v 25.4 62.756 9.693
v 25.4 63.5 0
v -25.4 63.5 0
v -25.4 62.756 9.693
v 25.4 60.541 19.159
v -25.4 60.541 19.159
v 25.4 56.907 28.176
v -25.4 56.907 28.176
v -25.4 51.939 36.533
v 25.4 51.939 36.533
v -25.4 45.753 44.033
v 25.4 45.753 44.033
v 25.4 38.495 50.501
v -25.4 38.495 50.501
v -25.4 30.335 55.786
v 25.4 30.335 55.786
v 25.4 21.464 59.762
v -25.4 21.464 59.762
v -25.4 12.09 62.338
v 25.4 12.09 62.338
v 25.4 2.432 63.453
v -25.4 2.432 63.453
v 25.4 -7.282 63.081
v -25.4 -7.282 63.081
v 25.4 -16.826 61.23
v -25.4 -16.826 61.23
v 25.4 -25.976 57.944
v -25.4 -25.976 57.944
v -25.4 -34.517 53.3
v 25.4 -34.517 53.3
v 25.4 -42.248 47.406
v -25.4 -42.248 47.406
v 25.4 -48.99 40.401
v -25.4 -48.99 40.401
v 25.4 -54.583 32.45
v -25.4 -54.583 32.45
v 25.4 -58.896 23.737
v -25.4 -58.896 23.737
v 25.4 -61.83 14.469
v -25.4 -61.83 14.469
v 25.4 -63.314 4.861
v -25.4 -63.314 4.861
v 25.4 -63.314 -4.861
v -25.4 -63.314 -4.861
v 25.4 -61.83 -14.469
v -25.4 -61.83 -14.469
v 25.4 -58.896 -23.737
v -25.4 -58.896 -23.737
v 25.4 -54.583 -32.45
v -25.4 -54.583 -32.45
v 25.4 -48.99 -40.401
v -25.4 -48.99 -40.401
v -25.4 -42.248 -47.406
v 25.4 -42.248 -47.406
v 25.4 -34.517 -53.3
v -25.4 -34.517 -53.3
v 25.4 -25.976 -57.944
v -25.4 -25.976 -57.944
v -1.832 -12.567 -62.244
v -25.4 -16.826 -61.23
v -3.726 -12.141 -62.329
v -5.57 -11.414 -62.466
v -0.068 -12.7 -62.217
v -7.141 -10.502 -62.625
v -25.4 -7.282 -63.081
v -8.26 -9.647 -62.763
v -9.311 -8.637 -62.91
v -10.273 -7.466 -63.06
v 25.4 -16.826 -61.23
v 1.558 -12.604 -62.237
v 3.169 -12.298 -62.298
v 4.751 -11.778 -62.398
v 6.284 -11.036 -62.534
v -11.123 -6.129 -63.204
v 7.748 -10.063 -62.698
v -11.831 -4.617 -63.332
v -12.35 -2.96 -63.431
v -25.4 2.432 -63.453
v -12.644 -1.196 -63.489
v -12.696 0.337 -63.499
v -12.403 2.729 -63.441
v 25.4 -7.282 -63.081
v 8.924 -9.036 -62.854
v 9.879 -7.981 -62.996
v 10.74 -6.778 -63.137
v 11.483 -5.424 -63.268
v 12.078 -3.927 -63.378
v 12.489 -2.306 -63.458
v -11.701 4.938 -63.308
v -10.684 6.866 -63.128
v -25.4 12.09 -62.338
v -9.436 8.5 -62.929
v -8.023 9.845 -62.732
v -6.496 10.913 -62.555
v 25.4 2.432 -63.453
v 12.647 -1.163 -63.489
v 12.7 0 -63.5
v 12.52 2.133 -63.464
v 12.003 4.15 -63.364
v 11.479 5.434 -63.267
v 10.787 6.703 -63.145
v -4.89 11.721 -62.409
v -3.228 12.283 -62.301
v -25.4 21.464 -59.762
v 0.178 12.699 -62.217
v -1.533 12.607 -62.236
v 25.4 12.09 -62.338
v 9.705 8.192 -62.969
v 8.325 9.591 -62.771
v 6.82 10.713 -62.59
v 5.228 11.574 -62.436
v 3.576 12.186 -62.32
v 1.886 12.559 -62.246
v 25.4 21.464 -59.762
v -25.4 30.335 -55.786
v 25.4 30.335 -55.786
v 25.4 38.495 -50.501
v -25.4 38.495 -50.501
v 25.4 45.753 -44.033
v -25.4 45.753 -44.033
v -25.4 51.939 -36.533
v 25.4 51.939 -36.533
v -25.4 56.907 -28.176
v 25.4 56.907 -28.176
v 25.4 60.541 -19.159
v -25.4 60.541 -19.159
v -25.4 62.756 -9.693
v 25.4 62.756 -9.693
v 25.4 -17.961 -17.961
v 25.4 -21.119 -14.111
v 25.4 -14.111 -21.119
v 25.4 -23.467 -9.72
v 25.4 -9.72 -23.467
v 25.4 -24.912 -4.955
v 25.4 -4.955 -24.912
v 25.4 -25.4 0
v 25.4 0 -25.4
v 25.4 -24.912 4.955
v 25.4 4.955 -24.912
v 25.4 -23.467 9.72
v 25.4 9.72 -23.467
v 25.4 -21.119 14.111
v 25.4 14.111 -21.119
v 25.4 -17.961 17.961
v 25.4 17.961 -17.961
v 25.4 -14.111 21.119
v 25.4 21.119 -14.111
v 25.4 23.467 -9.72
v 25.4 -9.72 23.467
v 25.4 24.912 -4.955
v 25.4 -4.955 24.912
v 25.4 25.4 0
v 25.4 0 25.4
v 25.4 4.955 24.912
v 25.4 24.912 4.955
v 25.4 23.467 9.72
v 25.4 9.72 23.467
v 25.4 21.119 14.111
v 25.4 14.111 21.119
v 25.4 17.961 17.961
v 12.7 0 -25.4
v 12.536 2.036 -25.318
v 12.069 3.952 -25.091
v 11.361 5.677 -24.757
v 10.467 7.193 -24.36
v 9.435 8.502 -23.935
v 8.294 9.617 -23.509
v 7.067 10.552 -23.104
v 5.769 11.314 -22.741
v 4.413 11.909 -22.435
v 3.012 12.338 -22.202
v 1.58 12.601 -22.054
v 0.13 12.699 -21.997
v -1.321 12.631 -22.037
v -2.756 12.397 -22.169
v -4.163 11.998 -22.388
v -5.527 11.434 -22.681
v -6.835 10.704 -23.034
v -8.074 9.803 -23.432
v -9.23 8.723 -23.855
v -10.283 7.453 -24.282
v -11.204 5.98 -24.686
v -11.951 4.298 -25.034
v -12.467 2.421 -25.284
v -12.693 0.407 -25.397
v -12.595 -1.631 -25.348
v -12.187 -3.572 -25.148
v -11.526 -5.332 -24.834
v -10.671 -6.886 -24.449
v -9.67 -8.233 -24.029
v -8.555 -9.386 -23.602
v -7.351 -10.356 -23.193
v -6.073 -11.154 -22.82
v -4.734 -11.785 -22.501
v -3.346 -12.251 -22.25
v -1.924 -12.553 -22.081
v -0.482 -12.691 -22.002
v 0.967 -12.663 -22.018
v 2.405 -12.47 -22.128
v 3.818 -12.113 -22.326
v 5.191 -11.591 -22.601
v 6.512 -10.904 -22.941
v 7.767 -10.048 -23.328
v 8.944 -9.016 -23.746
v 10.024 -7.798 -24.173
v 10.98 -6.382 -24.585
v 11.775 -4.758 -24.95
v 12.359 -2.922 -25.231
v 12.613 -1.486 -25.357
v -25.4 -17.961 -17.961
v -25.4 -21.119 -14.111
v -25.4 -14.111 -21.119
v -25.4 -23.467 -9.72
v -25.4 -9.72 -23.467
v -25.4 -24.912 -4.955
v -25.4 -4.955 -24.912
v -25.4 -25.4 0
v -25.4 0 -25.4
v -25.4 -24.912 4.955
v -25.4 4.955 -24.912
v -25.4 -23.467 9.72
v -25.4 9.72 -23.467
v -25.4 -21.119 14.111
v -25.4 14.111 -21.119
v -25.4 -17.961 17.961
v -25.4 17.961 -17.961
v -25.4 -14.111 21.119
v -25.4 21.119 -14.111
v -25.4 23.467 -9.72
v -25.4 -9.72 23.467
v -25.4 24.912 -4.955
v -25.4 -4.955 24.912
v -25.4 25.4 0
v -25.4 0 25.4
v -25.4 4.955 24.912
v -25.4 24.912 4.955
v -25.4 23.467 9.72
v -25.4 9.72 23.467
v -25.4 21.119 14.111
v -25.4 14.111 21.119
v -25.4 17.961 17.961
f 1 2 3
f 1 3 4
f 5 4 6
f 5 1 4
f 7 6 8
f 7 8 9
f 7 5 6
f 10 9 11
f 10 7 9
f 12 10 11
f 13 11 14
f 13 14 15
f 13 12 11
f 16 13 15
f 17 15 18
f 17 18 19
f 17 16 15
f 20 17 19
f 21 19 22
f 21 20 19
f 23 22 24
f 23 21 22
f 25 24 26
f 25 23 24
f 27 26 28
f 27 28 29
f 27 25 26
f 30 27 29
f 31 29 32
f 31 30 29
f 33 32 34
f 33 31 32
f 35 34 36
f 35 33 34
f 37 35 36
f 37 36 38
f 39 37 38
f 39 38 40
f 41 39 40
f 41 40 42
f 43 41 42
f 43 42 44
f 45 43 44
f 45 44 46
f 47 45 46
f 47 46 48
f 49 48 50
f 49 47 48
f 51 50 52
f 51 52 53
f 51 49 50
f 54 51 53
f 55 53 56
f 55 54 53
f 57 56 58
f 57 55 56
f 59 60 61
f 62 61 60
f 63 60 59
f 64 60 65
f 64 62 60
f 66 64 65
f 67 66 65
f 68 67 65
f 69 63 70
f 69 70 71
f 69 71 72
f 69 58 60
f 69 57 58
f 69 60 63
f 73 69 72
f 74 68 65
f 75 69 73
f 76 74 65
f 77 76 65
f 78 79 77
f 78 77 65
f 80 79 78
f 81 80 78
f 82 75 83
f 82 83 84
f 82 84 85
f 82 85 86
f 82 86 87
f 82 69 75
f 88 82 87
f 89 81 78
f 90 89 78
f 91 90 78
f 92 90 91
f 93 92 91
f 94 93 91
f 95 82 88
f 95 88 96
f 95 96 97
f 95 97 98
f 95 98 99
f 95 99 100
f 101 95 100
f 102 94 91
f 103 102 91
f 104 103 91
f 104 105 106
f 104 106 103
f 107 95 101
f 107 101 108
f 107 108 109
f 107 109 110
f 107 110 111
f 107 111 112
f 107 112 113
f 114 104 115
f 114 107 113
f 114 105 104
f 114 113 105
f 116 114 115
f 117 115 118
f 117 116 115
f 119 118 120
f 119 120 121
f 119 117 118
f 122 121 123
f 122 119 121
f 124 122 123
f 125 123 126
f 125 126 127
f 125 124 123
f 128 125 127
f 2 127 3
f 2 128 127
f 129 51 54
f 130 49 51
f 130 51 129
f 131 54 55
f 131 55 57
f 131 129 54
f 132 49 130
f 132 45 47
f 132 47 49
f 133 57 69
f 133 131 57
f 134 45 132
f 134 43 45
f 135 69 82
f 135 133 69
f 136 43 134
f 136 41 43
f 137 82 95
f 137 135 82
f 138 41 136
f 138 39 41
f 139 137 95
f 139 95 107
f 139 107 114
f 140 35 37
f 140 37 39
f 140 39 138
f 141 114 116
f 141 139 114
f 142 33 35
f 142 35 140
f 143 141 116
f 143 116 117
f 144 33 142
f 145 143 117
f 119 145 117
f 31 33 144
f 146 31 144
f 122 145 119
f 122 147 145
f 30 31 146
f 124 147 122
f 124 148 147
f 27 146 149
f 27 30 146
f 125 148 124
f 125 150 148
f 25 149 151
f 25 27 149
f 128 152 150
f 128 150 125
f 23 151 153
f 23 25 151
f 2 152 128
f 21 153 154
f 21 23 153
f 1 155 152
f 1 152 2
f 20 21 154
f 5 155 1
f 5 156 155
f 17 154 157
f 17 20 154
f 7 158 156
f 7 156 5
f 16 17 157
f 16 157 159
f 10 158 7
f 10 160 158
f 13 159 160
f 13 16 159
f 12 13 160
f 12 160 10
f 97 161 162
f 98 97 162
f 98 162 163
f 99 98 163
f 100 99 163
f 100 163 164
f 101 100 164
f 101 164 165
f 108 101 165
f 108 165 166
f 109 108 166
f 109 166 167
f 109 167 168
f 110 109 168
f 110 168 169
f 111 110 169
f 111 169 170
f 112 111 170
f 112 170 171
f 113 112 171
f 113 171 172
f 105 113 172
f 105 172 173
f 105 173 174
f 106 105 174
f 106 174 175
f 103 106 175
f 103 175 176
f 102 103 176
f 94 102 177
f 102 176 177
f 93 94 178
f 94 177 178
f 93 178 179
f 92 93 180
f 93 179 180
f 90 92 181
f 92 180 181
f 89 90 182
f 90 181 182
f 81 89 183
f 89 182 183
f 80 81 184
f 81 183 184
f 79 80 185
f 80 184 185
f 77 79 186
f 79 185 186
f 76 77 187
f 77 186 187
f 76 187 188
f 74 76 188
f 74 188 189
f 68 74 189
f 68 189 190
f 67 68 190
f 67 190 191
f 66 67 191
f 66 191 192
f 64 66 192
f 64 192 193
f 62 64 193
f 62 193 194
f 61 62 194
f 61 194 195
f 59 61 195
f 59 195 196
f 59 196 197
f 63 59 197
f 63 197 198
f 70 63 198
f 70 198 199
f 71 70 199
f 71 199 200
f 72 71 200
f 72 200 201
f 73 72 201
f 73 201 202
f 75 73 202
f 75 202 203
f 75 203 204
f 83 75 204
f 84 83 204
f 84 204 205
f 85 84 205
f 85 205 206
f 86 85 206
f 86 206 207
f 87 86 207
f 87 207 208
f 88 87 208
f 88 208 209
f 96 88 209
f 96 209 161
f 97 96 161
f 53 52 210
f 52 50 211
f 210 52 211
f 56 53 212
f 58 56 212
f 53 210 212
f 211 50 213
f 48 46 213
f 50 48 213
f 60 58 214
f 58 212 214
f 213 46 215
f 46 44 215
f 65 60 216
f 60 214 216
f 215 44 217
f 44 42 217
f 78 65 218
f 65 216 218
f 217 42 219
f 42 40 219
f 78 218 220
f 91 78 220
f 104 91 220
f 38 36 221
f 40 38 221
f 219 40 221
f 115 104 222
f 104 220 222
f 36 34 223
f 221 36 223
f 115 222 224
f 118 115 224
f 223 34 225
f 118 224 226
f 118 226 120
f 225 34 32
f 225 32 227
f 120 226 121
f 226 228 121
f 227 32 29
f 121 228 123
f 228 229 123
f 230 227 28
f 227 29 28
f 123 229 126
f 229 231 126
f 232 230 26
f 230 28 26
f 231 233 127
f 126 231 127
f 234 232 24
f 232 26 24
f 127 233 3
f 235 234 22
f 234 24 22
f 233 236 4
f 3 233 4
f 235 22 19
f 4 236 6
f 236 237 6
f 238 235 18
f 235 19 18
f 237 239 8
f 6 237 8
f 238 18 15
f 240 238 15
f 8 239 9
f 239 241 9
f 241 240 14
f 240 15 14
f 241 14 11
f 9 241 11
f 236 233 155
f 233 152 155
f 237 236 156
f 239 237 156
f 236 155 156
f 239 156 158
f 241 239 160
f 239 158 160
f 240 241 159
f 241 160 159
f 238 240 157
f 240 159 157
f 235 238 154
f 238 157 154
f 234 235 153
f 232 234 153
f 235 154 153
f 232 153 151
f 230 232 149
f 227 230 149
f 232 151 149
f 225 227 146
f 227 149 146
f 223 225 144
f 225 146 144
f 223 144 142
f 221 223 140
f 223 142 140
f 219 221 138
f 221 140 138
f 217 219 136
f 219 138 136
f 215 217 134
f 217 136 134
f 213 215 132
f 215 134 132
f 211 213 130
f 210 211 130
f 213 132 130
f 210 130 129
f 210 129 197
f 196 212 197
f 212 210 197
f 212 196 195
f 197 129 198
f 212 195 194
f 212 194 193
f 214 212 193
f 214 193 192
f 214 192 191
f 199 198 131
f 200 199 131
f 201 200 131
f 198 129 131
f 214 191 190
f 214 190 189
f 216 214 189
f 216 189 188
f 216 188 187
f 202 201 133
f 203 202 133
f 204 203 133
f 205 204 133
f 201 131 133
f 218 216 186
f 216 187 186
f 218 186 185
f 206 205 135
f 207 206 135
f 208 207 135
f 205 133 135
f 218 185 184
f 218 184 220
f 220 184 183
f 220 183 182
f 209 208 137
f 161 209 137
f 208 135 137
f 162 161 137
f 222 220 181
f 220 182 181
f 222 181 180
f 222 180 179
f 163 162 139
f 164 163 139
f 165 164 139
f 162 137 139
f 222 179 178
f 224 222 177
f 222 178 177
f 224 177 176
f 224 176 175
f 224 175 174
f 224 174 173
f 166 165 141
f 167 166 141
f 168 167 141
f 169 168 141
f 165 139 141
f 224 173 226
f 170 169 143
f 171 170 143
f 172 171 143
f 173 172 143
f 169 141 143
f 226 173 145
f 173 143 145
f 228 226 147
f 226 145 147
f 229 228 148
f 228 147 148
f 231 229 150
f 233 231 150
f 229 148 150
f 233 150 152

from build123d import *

# Parameters (mm, degrees)
F0_R     = 63.5
F1_DEPTH = 25.4
F2_R     = 12.7
F3_DEPTH = 76.2
F4_R     = 25.4
F5_DEPTH = 31.75


with BuildPart() as f1:
    # F0 (on Right) → F1 (new body, symmetric)
    with BuildSketch(Plane.YZ):
        Circle(F0_R)
    extrude(amount=F1_DEPTH, both=True)

    # F2 (on Top) → F3 (cut)
    with BuildSketch(Plane.XY):
        Circle(F2_R)
    extrude(amount=-F3_DEPTH, mode=Mode.SUBTRACT)

    # F4 (on Right) → F5 (cut, symmetric)
    with BuildSketch(Plane.YZ):
        Circle(F4_R)
    extrude(amount=F5_DEPTH, both=True, mode=Mode.SUBTRACT)


solid = f1.part
